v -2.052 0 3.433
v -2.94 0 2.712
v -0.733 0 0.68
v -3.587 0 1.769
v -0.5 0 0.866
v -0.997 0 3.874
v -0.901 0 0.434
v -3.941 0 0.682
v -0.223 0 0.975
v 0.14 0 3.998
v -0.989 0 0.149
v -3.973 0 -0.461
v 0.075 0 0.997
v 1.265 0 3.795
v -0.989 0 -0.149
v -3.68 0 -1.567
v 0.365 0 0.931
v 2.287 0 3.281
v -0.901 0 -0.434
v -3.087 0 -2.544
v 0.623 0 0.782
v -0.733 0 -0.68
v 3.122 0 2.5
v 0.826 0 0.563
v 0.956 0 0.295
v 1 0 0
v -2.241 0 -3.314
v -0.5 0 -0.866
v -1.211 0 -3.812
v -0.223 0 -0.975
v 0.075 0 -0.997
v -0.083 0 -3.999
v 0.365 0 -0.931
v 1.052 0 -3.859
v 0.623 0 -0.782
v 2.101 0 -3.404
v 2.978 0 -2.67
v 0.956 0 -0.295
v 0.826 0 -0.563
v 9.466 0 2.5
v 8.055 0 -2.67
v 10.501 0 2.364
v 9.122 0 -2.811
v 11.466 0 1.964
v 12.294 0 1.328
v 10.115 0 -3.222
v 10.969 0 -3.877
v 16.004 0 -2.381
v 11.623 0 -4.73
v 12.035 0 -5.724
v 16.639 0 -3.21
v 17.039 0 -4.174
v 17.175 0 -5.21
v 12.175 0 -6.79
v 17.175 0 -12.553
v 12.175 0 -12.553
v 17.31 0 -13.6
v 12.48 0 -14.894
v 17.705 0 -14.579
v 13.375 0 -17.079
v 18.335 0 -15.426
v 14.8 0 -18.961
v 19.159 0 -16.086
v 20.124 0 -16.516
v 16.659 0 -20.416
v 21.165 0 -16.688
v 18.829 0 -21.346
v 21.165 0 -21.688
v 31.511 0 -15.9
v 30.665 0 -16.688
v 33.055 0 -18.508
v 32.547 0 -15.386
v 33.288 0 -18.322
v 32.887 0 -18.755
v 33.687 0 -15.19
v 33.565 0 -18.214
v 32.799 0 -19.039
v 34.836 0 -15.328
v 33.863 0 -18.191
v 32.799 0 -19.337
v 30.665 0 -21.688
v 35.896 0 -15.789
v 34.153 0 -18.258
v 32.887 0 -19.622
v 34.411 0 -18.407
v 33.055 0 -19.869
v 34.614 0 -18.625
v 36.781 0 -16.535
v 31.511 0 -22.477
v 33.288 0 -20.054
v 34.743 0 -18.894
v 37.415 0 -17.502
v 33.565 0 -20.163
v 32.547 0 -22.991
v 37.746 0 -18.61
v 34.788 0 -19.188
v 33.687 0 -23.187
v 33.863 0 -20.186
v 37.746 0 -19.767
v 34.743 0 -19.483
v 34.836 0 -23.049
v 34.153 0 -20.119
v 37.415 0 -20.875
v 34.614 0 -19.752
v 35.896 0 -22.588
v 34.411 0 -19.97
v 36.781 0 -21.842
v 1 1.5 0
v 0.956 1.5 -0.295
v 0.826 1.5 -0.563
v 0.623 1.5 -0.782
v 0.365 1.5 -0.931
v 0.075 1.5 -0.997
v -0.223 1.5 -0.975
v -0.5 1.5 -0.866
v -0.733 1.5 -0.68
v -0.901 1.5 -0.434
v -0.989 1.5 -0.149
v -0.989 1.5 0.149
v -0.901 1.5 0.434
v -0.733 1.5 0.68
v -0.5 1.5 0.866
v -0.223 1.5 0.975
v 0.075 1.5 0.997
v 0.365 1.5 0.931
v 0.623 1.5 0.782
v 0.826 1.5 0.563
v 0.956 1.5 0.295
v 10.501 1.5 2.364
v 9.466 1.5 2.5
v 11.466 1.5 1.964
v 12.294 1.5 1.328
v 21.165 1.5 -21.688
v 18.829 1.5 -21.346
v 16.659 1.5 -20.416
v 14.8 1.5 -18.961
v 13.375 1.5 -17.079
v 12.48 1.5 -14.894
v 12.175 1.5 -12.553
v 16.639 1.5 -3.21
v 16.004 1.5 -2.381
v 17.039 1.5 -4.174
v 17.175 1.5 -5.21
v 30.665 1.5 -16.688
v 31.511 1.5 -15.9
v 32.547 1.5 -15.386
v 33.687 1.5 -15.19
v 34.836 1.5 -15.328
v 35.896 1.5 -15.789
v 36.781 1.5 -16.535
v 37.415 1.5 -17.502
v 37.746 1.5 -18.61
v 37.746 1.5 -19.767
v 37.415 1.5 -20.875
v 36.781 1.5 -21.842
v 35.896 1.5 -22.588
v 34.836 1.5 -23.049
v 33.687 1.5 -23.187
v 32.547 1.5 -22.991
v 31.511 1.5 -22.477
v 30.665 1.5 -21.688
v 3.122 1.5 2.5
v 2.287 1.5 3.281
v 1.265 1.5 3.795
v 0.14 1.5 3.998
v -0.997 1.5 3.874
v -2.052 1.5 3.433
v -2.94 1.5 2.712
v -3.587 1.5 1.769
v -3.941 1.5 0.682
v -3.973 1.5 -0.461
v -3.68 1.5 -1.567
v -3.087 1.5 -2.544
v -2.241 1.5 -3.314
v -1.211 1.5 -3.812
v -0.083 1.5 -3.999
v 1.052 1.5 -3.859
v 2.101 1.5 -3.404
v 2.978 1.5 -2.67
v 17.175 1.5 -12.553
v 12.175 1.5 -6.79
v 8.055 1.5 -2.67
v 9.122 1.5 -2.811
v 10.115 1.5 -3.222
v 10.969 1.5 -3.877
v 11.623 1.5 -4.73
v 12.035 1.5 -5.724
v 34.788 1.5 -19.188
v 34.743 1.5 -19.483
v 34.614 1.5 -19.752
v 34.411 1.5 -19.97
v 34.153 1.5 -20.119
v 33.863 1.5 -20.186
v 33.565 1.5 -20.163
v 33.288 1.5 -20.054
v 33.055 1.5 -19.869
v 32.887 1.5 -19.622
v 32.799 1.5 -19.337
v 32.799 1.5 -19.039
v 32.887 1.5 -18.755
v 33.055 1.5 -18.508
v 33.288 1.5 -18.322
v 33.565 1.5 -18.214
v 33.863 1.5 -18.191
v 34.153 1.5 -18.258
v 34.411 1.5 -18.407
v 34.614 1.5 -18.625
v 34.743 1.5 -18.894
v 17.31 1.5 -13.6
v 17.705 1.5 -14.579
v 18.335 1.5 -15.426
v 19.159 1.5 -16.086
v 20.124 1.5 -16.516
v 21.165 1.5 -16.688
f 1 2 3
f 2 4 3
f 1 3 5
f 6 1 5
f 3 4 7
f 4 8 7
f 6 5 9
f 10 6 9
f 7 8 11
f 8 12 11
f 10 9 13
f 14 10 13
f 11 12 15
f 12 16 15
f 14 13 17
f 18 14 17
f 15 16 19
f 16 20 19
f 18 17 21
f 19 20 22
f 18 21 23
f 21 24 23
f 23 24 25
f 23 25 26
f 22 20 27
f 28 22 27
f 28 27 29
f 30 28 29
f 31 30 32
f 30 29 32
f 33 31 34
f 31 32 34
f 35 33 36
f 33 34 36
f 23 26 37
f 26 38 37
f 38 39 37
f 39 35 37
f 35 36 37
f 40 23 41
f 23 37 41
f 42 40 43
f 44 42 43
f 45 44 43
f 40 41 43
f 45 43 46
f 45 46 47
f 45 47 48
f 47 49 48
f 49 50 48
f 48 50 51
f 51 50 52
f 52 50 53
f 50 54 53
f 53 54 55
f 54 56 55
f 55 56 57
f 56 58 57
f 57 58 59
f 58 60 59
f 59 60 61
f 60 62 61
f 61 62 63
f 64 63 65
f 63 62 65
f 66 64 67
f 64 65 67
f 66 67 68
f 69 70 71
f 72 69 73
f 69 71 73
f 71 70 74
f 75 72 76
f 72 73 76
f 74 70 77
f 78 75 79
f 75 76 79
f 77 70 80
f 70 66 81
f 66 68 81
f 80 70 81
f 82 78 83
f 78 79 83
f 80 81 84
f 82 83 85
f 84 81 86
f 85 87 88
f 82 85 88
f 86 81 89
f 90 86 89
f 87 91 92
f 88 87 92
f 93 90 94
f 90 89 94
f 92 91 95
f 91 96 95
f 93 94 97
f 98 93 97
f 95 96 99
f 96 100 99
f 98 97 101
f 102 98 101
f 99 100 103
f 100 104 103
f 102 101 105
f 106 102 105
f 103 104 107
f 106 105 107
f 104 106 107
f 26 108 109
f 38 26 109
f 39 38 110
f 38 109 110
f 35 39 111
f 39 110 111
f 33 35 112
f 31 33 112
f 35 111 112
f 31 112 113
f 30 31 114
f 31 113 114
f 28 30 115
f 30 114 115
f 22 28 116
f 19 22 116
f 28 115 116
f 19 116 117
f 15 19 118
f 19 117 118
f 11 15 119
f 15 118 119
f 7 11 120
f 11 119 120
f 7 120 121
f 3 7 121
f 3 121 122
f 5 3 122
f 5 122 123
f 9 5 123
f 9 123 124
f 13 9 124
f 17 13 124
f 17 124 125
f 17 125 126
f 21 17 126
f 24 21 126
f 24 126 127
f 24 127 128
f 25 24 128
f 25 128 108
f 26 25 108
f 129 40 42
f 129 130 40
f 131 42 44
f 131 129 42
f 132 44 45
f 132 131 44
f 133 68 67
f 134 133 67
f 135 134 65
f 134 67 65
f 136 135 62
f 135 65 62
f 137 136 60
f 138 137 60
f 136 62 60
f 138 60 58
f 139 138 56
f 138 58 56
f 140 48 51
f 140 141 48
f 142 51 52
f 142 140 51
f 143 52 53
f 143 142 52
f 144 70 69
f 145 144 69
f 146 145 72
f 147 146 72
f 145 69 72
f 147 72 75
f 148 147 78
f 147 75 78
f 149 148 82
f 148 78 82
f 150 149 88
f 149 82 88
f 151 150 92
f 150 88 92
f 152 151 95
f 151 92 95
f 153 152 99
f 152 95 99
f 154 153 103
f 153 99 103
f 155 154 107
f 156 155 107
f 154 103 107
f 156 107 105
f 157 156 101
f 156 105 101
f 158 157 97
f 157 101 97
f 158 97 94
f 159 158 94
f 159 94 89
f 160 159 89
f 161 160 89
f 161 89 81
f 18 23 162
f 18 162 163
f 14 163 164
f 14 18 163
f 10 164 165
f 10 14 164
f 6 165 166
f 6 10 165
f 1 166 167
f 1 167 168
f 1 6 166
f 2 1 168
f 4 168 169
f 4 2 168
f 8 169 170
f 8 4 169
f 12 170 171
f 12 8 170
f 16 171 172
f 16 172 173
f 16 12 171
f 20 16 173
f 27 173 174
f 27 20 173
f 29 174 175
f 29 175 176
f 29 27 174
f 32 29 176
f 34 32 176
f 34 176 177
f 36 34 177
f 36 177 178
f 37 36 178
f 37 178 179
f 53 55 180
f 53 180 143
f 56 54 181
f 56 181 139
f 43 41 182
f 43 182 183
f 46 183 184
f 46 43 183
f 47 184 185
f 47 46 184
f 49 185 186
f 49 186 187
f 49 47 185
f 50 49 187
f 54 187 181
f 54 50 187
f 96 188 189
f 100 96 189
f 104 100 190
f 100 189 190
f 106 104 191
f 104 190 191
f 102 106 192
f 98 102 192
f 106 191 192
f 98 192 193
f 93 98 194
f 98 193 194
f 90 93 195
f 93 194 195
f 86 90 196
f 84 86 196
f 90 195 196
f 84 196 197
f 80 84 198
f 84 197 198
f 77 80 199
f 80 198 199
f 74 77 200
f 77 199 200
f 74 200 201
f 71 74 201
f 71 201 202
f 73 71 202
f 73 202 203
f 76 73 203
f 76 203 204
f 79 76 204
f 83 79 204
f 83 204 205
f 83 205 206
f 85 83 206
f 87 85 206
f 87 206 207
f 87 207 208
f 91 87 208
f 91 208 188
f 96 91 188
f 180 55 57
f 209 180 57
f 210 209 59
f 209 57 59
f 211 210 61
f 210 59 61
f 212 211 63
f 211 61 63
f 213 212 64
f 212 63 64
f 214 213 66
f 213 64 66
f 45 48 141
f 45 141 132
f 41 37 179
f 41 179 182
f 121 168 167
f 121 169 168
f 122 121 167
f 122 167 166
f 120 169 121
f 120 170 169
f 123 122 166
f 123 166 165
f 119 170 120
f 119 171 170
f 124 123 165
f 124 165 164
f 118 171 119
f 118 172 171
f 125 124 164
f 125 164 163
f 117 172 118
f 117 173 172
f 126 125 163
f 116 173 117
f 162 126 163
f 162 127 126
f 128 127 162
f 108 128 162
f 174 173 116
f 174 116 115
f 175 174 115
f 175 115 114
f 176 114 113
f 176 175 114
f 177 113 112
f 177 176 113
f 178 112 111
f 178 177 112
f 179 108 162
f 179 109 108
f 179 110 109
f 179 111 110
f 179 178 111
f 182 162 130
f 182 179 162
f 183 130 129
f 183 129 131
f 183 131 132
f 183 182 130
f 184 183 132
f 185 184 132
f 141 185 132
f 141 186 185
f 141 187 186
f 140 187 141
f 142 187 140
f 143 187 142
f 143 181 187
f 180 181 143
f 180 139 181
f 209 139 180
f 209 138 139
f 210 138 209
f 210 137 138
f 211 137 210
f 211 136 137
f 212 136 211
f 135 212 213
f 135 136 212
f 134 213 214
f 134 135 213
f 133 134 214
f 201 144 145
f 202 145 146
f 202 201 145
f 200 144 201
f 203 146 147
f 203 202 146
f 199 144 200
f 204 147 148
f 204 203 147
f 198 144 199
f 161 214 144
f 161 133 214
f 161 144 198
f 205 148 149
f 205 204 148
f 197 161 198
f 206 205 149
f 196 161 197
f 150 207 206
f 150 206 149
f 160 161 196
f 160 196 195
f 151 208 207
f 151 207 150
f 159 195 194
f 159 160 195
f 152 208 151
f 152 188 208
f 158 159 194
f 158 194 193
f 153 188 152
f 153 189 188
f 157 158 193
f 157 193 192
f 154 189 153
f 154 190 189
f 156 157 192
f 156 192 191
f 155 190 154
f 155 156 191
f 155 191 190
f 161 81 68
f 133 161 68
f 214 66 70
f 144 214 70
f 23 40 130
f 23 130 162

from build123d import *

# Parameters (mm, degrees)
BOSS_EXTRUDE1_DEPTH = 1.5
FILLET1_R           = 4
SKETCH2_R           = 1
CUT_EXTRUDE1_DEPTH  = 11.5


with BuildPart() as part:
    # Sketch1 → Boss-Extrude1 (new body)
    with BuildSketch(Plane(origin=(0, 0, 0), x_dir=(1, 0, 0), z_dir=(0, 1, 0))):
        with BuildLine():
            Line((21.165401421, 16.688429867), (30.665401421, 16.688429867))
            ThreePointArc((30.665401421, 16.688429867), (37.78790042, 19.188429867), (30.665401421, 21.688429867))
            Line((30.665401421, 21.688429867), (21.165401421, 21.688429867))
            ThreePointArc((21.165401421, 21.688429867), (14.799770492, 18.961430624), (12.175333046, 12.552834047))
            Line((12.175333046, 12.552834047), (17.175333046, 12.552834047))
            ThreePointArc((17.175333046, 12.552834047), (18.33546909, 15.426150877), (21.165401421, 16.688429867))
        make_face()
        with BuildLine():
            ThreePointArc((8.055333046, 2.670166466), (10.968612985, 3.876886527), (12.175333046, 6.790166466))
            Line((12.175333046, 6.790166466), (12.175333046, 12.552834047))
            Line((12.175333046, 12.552834047), (17.175333046, 12.552834047))
            Line((17.175333046, 12.552834047), (17.175333046, 3.552834047))
            Line((17.175333046, 3.552834047), (11.122498999, -2.5))
            Line((11.122498999, -2.5), (3.122498999, -2.5))
            ThreePointArc((3.122498999, -2.5), (-3.99844492, -0.111526763), (2.978289953, 2.670166466))
            Line((2.978289953, 2.670166466), (8.055333046, 2.670166466))
        make_face()
    extrude(amount=BOSS_EXTRUDE1_DEPTH)

    # Fillet1
    fillet1_edges = [part.edges().sort_by_distance(p)[0] for p in [
        (17.175333046, 0.75, -3.552834047),
        (11.122498999, 0.75, 2.5),
    ]]
    fillet(fillet1_edges, radius=FILLET1_R)

    # Sketch2 → Cut-Extrude1 (cut)
    with BuildSketch(Plane(origin=(0, 1.5, 0), x_dir=(1, 0, 0), z_dir=(0, 1, 0))):
        Circle(SKETCH2_R)
        with Locations((33.78790042, 19.188429867)):
            Circle(SKETCH2_R)
    extrude(amount=-CUT_EXTRUDE1_DEPTH, mode=Mode.SUBTRACT)


solid = part.part
